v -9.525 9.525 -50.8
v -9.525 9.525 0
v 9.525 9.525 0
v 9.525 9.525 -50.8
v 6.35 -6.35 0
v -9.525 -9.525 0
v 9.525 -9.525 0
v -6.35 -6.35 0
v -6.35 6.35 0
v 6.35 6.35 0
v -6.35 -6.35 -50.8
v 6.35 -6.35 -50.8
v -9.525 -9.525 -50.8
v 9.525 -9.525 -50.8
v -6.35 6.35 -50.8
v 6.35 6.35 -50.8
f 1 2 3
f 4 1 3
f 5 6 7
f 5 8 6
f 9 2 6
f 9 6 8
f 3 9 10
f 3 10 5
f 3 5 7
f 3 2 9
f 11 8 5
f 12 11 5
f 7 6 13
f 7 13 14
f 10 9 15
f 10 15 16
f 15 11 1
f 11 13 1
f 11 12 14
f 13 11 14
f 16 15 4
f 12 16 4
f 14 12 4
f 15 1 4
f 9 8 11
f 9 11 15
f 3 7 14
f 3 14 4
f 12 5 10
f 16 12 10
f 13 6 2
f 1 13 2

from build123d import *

# Parameters (mm, degrees)
SKETCH1_W           = 19.05
SKETCH1_H           = 19.05
BOSS_EXTRUDE1_DEPTH = 50.8
CUT_EXTRUDE1_REACH  = 52.8
SKETCH2_W           = 12.7
SKETCH2_H           = 12.7


with BuildPart() as part:
    # Sketch1 → Boss-Extrude1 (new body)
    with BuildSketch(Plane.XY):
        Rectangle(SKETCH1_W, SKETCH1_H)
    extrude(amount=-BOSS_EXTRUDE1_DEPTH)

    # Sketch2 → Cut-Extrude1 (cut, up to next)
    with BuildSketch(Plane.XY, mode=Mode.PRIVATE) as cut_extrude1_sk1:
        Rectangle(SKETCH2_W, SKETCH2_H)
    cut_extrude1_tool1 = extrude(cut_extrude1_sk1.sketch, amount=-CUT_EXTRUDE1_REACH, mode=Mode.PRIVATE) & part.part
    add(cut_extrude1_tool1.solids().sort_by_distance((0, 0, 0))[0], mode=Mode.SUBTRACT)


solid = part.part
